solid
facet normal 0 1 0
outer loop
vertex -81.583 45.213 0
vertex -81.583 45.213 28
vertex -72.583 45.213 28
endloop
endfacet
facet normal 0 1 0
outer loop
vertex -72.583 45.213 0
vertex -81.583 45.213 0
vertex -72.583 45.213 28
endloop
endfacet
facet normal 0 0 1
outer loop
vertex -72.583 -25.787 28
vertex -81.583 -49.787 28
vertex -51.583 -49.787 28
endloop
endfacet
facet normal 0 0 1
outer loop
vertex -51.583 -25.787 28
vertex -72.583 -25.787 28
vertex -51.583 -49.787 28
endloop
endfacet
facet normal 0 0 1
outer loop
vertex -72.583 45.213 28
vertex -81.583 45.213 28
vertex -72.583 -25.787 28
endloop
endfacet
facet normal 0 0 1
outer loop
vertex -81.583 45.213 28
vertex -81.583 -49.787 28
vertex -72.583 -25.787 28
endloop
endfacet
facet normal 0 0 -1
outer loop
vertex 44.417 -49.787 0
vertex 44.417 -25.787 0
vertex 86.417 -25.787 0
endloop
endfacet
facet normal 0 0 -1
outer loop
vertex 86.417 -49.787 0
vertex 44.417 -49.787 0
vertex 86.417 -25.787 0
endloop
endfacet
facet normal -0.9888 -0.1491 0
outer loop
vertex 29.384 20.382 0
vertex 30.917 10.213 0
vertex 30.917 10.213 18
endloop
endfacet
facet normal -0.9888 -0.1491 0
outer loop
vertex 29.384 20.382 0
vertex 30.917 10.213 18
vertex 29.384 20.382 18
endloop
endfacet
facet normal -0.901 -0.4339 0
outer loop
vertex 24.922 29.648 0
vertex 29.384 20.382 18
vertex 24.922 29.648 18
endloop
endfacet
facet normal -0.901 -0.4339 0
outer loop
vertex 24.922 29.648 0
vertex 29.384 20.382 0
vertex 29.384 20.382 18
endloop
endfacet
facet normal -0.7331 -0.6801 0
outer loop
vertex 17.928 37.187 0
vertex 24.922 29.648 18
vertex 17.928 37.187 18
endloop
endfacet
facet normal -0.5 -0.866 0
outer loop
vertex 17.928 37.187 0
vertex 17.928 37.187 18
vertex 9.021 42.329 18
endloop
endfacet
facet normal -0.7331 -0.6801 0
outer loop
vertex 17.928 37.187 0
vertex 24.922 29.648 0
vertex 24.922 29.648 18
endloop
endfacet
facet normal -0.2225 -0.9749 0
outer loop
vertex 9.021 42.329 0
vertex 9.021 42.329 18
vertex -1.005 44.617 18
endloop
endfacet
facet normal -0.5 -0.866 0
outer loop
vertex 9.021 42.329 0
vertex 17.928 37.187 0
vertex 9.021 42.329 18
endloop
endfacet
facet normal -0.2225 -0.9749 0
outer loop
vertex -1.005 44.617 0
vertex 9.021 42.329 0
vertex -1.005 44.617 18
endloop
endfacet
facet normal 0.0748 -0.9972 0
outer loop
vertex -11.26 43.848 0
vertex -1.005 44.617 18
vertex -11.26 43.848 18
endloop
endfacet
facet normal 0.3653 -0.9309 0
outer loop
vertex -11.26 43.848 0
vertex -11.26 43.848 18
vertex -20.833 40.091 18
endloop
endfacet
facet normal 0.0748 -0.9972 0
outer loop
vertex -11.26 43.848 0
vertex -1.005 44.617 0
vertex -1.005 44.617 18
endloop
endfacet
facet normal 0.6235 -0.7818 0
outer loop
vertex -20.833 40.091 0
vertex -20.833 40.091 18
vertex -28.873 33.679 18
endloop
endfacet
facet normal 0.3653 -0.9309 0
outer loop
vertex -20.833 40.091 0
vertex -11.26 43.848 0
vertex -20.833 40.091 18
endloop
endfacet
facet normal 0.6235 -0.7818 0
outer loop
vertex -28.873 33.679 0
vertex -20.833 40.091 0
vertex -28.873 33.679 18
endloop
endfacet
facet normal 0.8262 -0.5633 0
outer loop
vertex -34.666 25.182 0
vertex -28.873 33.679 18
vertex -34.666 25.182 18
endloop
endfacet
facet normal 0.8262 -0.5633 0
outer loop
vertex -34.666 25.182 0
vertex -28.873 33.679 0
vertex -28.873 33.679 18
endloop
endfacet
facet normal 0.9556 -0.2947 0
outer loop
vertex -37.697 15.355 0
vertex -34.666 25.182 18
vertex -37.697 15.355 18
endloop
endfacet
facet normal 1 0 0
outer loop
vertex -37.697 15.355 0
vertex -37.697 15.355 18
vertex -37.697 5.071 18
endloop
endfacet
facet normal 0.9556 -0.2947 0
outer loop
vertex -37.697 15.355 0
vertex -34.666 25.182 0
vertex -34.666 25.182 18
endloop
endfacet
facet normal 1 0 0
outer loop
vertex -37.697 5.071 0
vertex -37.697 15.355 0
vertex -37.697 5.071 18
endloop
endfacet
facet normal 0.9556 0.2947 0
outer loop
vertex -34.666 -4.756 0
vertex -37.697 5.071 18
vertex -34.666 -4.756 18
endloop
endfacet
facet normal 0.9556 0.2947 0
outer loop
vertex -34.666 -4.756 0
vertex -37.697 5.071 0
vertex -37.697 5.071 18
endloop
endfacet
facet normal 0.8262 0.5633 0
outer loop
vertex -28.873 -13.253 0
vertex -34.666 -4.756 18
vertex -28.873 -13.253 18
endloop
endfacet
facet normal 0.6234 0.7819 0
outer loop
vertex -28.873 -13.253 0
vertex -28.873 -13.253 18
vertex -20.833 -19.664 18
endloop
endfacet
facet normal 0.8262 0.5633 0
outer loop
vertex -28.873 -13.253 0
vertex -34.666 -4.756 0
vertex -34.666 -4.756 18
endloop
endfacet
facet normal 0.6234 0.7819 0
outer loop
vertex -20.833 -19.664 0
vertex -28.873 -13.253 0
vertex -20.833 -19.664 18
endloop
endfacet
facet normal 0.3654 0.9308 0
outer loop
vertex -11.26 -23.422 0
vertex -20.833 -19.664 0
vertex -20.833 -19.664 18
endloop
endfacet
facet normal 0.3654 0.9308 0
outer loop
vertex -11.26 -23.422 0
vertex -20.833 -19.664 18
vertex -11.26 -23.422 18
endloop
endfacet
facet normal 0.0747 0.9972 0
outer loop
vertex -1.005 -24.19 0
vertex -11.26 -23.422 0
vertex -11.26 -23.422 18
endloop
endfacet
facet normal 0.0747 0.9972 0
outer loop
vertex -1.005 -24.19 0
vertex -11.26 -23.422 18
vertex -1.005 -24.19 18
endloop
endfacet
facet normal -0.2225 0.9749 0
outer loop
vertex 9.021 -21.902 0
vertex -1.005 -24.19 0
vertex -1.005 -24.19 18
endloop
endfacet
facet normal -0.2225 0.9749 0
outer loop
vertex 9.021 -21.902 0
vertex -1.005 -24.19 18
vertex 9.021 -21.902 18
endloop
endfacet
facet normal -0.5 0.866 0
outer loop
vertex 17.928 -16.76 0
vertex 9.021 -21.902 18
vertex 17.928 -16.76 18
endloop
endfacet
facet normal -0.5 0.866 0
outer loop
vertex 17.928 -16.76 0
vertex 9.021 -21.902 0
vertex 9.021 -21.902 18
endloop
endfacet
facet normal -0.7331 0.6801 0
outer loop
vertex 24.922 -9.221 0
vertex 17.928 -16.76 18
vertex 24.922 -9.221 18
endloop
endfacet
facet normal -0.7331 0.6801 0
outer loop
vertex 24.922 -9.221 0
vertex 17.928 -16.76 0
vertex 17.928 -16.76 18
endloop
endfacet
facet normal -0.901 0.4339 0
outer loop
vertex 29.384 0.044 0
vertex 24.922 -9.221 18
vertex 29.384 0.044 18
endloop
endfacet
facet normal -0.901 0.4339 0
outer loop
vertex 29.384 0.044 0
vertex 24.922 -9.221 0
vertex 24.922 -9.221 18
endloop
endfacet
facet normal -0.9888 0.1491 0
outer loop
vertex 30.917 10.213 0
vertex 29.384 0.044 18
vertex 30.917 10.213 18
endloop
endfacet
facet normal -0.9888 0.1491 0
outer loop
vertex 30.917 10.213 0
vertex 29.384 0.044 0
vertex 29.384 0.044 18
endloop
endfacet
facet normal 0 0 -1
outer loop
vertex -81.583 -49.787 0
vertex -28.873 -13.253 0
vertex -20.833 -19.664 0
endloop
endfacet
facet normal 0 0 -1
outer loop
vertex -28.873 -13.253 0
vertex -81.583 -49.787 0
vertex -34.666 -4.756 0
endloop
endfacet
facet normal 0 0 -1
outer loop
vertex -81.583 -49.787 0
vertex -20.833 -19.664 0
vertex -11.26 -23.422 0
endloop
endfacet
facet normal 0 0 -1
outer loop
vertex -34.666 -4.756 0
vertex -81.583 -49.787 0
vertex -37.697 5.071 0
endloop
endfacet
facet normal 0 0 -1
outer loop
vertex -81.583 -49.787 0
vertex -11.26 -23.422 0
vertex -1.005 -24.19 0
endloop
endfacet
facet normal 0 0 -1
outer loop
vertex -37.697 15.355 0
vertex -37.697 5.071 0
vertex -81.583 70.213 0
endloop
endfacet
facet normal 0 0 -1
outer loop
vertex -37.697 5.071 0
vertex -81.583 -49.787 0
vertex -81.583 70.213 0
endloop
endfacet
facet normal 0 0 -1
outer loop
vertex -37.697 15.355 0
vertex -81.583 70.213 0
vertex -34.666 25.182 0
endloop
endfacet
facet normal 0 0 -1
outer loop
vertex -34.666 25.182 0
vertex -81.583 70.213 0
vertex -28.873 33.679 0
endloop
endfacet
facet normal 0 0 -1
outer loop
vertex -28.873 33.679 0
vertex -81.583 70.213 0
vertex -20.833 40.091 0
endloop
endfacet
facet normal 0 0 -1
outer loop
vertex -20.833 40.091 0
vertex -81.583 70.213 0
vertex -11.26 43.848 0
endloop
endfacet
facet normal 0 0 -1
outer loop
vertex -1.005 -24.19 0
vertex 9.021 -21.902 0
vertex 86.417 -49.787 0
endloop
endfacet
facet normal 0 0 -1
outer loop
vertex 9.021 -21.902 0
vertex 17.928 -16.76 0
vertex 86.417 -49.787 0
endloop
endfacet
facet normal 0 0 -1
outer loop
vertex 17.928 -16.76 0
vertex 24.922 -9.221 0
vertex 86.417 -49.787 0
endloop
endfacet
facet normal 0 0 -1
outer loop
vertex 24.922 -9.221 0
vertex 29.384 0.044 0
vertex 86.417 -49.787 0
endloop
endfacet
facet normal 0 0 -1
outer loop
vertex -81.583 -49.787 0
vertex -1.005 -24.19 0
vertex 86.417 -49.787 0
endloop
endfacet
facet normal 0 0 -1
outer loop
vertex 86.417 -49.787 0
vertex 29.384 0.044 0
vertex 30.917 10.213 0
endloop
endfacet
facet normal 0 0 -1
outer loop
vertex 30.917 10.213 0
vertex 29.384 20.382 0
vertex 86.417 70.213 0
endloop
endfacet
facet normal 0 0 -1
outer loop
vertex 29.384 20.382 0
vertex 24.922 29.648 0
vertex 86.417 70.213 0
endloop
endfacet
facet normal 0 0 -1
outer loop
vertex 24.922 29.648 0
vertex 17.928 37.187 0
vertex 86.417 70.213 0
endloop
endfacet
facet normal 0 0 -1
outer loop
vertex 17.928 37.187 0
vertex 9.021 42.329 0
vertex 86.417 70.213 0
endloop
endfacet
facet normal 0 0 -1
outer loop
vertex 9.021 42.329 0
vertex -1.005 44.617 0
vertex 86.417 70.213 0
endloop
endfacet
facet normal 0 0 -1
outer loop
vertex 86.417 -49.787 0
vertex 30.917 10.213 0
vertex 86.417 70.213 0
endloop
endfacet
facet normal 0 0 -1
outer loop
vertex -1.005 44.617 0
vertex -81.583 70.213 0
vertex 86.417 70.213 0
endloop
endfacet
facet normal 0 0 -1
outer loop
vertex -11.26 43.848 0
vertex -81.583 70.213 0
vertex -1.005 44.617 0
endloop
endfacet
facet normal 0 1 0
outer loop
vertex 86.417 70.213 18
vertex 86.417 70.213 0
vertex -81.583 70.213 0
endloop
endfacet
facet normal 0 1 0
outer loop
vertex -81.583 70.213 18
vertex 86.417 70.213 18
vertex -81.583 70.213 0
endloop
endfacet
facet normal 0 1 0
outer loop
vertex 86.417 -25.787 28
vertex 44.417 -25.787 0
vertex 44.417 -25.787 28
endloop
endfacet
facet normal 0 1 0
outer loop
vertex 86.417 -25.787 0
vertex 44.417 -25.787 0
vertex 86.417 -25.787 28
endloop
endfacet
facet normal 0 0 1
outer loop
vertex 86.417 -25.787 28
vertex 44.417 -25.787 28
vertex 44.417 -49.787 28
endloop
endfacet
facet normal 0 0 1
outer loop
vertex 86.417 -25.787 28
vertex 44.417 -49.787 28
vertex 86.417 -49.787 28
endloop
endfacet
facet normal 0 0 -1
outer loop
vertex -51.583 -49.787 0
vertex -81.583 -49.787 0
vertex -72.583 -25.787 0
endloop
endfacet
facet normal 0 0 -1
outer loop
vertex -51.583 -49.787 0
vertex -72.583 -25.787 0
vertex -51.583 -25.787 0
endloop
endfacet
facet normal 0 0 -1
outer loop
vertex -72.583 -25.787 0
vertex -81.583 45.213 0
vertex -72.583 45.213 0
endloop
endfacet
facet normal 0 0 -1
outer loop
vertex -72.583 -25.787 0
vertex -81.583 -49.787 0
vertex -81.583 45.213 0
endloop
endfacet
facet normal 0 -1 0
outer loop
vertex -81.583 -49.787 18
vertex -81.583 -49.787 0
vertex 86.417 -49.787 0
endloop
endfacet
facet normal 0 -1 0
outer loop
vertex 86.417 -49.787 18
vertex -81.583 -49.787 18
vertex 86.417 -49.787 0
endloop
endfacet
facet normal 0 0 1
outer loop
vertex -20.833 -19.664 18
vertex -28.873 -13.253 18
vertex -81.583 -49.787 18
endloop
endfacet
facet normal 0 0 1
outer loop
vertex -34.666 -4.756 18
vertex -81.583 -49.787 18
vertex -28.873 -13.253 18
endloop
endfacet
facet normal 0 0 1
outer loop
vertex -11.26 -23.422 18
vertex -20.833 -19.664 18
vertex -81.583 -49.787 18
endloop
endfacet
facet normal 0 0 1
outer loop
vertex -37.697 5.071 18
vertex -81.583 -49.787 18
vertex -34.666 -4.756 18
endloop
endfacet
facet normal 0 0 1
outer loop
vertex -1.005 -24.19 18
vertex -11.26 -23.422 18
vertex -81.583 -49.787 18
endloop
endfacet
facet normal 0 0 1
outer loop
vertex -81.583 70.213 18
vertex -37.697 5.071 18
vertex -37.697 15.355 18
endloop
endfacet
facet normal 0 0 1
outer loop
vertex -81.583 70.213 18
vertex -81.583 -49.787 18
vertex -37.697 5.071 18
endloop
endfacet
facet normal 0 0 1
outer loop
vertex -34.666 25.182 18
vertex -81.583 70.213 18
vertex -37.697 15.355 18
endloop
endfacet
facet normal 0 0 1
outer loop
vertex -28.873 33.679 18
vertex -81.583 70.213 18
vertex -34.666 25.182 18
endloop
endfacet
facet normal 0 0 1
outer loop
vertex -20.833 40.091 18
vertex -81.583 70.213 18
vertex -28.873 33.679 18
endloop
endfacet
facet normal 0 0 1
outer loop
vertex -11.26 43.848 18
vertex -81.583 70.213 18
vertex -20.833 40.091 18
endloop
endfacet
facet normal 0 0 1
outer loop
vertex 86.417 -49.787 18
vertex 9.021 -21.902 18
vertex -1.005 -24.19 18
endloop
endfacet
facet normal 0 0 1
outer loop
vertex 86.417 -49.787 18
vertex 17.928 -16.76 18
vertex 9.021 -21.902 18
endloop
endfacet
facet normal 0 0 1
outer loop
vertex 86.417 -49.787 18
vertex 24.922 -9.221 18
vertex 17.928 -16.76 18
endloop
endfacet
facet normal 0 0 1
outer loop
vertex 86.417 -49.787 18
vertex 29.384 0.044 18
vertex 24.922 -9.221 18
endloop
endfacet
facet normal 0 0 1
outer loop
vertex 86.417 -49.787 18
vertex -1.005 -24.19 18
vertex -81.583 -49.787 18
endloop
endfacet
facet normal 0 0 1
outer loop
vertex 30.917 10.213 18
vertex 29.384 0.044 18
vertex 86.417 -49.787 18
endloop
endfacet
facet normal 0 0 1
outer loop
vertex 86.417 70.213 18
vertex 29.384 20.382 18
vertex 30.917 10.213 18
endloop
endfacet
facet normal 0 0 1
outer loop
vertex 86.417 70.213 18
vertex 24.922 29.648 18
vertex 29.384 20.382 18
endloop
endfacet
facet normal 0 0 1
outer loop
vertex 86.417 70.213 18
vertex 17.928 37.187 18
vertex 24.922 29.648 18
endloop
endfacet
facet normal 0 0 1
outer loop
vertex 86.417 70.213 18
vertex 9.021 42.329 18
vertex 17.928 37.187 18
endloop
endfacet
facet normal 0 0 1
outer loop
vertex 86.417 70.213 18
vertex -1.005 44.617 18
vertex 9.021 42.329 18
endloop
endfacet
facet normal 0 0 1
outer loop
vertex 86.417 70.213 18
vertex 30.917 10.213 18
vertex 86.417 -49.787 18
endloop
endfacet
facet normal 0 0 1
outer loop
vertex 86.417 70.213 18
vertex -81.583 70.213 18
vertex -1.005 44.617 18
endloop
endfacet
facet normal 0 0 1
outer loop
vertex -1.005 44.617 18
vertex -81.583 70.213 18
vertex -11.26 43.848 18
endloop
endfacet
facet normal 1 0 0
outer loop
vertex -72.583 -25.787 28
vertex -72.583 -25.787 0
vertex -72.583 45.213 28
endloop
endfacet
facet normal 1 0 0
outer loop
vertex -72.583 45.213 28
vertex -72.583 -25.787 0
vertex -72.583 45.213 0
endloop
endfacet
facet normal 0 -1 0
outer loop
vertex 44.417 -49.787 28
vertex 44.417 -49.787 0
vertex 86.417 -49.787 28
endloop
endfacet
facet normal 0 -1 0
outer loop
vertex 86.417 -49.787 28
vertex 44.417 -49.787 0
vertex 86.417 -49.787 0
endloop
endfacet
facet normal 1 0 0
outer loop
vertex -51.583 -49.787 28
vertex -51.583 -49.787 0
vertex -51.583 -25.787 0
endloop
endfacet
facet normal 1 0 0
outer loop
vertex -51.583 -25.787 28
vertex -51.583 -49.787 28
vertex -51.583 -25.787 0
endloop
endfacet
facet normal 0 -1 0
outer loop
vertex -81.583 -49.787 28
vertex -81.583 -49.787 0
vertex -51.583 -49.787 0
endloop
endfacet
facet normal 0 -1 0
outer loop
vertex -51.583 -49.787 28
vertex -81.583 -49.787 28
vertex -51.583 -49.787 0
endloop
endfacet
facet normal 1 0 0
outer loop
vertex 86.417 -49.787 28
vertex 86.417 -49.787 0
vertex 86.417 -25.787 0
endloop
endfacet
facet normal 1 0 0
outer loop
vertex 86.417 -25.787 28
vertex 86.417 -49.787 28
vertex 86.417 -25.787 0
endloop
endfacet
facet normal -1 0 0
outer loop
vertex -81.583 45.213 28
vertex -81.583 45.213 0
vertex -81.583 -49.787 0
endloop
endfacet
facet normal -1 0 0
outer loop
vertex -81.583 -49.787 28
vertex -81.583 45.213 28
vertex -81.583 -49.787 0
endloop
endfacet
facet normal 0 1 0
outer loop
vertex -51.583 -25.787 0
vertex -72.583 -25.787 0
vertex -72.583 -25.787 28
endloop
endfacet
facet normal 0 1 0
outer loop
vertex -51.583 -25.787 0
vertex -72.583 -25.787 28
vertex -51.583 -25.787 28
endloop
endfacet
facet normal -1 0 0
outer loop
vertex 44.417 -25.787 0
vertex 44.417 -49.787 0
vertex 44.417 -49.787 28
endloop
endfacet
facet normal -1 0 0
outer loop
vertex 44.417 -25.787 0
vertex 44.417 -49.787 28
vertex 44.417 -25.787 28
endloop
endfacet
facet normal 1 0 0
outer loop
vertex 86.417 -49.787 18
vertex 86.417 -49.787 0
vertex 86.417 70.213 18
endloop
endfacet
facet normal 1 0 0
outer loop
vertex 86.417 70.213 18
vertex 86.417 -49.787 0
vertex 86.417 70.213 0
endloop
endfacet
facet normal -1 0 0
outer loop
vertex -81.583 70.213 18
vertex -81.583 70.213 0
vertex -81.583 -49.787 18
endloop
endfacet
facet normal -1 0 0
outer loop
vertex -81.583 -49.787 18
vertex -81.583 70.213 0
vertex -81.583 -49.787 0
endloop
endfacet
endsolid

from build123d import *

# Parameters (mm, degrees)
F0_W     = 9
F0_H     = 71
F0_H_2   = 24
F0_W_2   = 21
F0_W_3   = 42
F1_DEPTH = 28
F0_R     = 48
F2_DEPTH = 18
F0_R_2   = 34.5
F3_DEPTH = 18


with BuildPart() as f1:
    # F0 (on Top) → F1 (new body)
    with BuildSketch(Plane.XY):
        with Locations((-77.082793, 9.713417)):
            Rectangle(F0_W, F0_H)
        with Locations((-77.082793, -37.786583)):
            Rectangle(F0_W, F0_H_2)
        with Locations((-62.082793, -37.786583)):
            Rectangle(F0_W_2, F0_H_2)
        with Locations((65.417207, -37.786583)):
            Rectangle(F0_W_3, F0_H_2)
    extrude(amount=F1_DEPTH)


with BuildPart() as f2:
    # F0 (on Top) → F2 (new body)
    with BuildSketch(Plane.XY):
        Polygon((86.417207, 70.213417), (-81.582793, 70.213417), (-81.582793, 45.213417), (-72.582793, 45.213417), (-72.582793, -25.786583), (-51.582793, -25.786583), (-51.582793, -49.786583), (44.417207, -49.786583), (44.417207, -25.786583), (86.417207, -25.786583), align=None)
        with Locations((-3.582793, 10.213417)):
            Circle(F0_R, mode=Mode.SUBTRACT)
        with Locations((-77.082793, 9.713417)):
            Rectangle(F0_W, F0_H)
        with Locations((65.417207, -37.786583)):
            Rectangle(F0_W_3, F0_H_2)
        with Locations((-77.082793, -37.786583)):
            Rectangle(F0_W, F0_H_2)
        with Locations((-62.082793, -37.786583)):
            Rectangle(F0_W_2, F0_H_2)
    extrude(amount=F2_DEPTH)

    # F0 (on Top) → F3 (join)
    with BuildSketch(Plane.XY):
        with Locations((-3.582793, 10.213417)):
            Circle(F0_R)
        with Locations((-3.582793, 10.213417)):
            Circle(F0_R_2, mode=Mode.SUBTRACT)
    extrude(amount=F3_DEPTH)


solid = Compound([f1.part, f2.part])
